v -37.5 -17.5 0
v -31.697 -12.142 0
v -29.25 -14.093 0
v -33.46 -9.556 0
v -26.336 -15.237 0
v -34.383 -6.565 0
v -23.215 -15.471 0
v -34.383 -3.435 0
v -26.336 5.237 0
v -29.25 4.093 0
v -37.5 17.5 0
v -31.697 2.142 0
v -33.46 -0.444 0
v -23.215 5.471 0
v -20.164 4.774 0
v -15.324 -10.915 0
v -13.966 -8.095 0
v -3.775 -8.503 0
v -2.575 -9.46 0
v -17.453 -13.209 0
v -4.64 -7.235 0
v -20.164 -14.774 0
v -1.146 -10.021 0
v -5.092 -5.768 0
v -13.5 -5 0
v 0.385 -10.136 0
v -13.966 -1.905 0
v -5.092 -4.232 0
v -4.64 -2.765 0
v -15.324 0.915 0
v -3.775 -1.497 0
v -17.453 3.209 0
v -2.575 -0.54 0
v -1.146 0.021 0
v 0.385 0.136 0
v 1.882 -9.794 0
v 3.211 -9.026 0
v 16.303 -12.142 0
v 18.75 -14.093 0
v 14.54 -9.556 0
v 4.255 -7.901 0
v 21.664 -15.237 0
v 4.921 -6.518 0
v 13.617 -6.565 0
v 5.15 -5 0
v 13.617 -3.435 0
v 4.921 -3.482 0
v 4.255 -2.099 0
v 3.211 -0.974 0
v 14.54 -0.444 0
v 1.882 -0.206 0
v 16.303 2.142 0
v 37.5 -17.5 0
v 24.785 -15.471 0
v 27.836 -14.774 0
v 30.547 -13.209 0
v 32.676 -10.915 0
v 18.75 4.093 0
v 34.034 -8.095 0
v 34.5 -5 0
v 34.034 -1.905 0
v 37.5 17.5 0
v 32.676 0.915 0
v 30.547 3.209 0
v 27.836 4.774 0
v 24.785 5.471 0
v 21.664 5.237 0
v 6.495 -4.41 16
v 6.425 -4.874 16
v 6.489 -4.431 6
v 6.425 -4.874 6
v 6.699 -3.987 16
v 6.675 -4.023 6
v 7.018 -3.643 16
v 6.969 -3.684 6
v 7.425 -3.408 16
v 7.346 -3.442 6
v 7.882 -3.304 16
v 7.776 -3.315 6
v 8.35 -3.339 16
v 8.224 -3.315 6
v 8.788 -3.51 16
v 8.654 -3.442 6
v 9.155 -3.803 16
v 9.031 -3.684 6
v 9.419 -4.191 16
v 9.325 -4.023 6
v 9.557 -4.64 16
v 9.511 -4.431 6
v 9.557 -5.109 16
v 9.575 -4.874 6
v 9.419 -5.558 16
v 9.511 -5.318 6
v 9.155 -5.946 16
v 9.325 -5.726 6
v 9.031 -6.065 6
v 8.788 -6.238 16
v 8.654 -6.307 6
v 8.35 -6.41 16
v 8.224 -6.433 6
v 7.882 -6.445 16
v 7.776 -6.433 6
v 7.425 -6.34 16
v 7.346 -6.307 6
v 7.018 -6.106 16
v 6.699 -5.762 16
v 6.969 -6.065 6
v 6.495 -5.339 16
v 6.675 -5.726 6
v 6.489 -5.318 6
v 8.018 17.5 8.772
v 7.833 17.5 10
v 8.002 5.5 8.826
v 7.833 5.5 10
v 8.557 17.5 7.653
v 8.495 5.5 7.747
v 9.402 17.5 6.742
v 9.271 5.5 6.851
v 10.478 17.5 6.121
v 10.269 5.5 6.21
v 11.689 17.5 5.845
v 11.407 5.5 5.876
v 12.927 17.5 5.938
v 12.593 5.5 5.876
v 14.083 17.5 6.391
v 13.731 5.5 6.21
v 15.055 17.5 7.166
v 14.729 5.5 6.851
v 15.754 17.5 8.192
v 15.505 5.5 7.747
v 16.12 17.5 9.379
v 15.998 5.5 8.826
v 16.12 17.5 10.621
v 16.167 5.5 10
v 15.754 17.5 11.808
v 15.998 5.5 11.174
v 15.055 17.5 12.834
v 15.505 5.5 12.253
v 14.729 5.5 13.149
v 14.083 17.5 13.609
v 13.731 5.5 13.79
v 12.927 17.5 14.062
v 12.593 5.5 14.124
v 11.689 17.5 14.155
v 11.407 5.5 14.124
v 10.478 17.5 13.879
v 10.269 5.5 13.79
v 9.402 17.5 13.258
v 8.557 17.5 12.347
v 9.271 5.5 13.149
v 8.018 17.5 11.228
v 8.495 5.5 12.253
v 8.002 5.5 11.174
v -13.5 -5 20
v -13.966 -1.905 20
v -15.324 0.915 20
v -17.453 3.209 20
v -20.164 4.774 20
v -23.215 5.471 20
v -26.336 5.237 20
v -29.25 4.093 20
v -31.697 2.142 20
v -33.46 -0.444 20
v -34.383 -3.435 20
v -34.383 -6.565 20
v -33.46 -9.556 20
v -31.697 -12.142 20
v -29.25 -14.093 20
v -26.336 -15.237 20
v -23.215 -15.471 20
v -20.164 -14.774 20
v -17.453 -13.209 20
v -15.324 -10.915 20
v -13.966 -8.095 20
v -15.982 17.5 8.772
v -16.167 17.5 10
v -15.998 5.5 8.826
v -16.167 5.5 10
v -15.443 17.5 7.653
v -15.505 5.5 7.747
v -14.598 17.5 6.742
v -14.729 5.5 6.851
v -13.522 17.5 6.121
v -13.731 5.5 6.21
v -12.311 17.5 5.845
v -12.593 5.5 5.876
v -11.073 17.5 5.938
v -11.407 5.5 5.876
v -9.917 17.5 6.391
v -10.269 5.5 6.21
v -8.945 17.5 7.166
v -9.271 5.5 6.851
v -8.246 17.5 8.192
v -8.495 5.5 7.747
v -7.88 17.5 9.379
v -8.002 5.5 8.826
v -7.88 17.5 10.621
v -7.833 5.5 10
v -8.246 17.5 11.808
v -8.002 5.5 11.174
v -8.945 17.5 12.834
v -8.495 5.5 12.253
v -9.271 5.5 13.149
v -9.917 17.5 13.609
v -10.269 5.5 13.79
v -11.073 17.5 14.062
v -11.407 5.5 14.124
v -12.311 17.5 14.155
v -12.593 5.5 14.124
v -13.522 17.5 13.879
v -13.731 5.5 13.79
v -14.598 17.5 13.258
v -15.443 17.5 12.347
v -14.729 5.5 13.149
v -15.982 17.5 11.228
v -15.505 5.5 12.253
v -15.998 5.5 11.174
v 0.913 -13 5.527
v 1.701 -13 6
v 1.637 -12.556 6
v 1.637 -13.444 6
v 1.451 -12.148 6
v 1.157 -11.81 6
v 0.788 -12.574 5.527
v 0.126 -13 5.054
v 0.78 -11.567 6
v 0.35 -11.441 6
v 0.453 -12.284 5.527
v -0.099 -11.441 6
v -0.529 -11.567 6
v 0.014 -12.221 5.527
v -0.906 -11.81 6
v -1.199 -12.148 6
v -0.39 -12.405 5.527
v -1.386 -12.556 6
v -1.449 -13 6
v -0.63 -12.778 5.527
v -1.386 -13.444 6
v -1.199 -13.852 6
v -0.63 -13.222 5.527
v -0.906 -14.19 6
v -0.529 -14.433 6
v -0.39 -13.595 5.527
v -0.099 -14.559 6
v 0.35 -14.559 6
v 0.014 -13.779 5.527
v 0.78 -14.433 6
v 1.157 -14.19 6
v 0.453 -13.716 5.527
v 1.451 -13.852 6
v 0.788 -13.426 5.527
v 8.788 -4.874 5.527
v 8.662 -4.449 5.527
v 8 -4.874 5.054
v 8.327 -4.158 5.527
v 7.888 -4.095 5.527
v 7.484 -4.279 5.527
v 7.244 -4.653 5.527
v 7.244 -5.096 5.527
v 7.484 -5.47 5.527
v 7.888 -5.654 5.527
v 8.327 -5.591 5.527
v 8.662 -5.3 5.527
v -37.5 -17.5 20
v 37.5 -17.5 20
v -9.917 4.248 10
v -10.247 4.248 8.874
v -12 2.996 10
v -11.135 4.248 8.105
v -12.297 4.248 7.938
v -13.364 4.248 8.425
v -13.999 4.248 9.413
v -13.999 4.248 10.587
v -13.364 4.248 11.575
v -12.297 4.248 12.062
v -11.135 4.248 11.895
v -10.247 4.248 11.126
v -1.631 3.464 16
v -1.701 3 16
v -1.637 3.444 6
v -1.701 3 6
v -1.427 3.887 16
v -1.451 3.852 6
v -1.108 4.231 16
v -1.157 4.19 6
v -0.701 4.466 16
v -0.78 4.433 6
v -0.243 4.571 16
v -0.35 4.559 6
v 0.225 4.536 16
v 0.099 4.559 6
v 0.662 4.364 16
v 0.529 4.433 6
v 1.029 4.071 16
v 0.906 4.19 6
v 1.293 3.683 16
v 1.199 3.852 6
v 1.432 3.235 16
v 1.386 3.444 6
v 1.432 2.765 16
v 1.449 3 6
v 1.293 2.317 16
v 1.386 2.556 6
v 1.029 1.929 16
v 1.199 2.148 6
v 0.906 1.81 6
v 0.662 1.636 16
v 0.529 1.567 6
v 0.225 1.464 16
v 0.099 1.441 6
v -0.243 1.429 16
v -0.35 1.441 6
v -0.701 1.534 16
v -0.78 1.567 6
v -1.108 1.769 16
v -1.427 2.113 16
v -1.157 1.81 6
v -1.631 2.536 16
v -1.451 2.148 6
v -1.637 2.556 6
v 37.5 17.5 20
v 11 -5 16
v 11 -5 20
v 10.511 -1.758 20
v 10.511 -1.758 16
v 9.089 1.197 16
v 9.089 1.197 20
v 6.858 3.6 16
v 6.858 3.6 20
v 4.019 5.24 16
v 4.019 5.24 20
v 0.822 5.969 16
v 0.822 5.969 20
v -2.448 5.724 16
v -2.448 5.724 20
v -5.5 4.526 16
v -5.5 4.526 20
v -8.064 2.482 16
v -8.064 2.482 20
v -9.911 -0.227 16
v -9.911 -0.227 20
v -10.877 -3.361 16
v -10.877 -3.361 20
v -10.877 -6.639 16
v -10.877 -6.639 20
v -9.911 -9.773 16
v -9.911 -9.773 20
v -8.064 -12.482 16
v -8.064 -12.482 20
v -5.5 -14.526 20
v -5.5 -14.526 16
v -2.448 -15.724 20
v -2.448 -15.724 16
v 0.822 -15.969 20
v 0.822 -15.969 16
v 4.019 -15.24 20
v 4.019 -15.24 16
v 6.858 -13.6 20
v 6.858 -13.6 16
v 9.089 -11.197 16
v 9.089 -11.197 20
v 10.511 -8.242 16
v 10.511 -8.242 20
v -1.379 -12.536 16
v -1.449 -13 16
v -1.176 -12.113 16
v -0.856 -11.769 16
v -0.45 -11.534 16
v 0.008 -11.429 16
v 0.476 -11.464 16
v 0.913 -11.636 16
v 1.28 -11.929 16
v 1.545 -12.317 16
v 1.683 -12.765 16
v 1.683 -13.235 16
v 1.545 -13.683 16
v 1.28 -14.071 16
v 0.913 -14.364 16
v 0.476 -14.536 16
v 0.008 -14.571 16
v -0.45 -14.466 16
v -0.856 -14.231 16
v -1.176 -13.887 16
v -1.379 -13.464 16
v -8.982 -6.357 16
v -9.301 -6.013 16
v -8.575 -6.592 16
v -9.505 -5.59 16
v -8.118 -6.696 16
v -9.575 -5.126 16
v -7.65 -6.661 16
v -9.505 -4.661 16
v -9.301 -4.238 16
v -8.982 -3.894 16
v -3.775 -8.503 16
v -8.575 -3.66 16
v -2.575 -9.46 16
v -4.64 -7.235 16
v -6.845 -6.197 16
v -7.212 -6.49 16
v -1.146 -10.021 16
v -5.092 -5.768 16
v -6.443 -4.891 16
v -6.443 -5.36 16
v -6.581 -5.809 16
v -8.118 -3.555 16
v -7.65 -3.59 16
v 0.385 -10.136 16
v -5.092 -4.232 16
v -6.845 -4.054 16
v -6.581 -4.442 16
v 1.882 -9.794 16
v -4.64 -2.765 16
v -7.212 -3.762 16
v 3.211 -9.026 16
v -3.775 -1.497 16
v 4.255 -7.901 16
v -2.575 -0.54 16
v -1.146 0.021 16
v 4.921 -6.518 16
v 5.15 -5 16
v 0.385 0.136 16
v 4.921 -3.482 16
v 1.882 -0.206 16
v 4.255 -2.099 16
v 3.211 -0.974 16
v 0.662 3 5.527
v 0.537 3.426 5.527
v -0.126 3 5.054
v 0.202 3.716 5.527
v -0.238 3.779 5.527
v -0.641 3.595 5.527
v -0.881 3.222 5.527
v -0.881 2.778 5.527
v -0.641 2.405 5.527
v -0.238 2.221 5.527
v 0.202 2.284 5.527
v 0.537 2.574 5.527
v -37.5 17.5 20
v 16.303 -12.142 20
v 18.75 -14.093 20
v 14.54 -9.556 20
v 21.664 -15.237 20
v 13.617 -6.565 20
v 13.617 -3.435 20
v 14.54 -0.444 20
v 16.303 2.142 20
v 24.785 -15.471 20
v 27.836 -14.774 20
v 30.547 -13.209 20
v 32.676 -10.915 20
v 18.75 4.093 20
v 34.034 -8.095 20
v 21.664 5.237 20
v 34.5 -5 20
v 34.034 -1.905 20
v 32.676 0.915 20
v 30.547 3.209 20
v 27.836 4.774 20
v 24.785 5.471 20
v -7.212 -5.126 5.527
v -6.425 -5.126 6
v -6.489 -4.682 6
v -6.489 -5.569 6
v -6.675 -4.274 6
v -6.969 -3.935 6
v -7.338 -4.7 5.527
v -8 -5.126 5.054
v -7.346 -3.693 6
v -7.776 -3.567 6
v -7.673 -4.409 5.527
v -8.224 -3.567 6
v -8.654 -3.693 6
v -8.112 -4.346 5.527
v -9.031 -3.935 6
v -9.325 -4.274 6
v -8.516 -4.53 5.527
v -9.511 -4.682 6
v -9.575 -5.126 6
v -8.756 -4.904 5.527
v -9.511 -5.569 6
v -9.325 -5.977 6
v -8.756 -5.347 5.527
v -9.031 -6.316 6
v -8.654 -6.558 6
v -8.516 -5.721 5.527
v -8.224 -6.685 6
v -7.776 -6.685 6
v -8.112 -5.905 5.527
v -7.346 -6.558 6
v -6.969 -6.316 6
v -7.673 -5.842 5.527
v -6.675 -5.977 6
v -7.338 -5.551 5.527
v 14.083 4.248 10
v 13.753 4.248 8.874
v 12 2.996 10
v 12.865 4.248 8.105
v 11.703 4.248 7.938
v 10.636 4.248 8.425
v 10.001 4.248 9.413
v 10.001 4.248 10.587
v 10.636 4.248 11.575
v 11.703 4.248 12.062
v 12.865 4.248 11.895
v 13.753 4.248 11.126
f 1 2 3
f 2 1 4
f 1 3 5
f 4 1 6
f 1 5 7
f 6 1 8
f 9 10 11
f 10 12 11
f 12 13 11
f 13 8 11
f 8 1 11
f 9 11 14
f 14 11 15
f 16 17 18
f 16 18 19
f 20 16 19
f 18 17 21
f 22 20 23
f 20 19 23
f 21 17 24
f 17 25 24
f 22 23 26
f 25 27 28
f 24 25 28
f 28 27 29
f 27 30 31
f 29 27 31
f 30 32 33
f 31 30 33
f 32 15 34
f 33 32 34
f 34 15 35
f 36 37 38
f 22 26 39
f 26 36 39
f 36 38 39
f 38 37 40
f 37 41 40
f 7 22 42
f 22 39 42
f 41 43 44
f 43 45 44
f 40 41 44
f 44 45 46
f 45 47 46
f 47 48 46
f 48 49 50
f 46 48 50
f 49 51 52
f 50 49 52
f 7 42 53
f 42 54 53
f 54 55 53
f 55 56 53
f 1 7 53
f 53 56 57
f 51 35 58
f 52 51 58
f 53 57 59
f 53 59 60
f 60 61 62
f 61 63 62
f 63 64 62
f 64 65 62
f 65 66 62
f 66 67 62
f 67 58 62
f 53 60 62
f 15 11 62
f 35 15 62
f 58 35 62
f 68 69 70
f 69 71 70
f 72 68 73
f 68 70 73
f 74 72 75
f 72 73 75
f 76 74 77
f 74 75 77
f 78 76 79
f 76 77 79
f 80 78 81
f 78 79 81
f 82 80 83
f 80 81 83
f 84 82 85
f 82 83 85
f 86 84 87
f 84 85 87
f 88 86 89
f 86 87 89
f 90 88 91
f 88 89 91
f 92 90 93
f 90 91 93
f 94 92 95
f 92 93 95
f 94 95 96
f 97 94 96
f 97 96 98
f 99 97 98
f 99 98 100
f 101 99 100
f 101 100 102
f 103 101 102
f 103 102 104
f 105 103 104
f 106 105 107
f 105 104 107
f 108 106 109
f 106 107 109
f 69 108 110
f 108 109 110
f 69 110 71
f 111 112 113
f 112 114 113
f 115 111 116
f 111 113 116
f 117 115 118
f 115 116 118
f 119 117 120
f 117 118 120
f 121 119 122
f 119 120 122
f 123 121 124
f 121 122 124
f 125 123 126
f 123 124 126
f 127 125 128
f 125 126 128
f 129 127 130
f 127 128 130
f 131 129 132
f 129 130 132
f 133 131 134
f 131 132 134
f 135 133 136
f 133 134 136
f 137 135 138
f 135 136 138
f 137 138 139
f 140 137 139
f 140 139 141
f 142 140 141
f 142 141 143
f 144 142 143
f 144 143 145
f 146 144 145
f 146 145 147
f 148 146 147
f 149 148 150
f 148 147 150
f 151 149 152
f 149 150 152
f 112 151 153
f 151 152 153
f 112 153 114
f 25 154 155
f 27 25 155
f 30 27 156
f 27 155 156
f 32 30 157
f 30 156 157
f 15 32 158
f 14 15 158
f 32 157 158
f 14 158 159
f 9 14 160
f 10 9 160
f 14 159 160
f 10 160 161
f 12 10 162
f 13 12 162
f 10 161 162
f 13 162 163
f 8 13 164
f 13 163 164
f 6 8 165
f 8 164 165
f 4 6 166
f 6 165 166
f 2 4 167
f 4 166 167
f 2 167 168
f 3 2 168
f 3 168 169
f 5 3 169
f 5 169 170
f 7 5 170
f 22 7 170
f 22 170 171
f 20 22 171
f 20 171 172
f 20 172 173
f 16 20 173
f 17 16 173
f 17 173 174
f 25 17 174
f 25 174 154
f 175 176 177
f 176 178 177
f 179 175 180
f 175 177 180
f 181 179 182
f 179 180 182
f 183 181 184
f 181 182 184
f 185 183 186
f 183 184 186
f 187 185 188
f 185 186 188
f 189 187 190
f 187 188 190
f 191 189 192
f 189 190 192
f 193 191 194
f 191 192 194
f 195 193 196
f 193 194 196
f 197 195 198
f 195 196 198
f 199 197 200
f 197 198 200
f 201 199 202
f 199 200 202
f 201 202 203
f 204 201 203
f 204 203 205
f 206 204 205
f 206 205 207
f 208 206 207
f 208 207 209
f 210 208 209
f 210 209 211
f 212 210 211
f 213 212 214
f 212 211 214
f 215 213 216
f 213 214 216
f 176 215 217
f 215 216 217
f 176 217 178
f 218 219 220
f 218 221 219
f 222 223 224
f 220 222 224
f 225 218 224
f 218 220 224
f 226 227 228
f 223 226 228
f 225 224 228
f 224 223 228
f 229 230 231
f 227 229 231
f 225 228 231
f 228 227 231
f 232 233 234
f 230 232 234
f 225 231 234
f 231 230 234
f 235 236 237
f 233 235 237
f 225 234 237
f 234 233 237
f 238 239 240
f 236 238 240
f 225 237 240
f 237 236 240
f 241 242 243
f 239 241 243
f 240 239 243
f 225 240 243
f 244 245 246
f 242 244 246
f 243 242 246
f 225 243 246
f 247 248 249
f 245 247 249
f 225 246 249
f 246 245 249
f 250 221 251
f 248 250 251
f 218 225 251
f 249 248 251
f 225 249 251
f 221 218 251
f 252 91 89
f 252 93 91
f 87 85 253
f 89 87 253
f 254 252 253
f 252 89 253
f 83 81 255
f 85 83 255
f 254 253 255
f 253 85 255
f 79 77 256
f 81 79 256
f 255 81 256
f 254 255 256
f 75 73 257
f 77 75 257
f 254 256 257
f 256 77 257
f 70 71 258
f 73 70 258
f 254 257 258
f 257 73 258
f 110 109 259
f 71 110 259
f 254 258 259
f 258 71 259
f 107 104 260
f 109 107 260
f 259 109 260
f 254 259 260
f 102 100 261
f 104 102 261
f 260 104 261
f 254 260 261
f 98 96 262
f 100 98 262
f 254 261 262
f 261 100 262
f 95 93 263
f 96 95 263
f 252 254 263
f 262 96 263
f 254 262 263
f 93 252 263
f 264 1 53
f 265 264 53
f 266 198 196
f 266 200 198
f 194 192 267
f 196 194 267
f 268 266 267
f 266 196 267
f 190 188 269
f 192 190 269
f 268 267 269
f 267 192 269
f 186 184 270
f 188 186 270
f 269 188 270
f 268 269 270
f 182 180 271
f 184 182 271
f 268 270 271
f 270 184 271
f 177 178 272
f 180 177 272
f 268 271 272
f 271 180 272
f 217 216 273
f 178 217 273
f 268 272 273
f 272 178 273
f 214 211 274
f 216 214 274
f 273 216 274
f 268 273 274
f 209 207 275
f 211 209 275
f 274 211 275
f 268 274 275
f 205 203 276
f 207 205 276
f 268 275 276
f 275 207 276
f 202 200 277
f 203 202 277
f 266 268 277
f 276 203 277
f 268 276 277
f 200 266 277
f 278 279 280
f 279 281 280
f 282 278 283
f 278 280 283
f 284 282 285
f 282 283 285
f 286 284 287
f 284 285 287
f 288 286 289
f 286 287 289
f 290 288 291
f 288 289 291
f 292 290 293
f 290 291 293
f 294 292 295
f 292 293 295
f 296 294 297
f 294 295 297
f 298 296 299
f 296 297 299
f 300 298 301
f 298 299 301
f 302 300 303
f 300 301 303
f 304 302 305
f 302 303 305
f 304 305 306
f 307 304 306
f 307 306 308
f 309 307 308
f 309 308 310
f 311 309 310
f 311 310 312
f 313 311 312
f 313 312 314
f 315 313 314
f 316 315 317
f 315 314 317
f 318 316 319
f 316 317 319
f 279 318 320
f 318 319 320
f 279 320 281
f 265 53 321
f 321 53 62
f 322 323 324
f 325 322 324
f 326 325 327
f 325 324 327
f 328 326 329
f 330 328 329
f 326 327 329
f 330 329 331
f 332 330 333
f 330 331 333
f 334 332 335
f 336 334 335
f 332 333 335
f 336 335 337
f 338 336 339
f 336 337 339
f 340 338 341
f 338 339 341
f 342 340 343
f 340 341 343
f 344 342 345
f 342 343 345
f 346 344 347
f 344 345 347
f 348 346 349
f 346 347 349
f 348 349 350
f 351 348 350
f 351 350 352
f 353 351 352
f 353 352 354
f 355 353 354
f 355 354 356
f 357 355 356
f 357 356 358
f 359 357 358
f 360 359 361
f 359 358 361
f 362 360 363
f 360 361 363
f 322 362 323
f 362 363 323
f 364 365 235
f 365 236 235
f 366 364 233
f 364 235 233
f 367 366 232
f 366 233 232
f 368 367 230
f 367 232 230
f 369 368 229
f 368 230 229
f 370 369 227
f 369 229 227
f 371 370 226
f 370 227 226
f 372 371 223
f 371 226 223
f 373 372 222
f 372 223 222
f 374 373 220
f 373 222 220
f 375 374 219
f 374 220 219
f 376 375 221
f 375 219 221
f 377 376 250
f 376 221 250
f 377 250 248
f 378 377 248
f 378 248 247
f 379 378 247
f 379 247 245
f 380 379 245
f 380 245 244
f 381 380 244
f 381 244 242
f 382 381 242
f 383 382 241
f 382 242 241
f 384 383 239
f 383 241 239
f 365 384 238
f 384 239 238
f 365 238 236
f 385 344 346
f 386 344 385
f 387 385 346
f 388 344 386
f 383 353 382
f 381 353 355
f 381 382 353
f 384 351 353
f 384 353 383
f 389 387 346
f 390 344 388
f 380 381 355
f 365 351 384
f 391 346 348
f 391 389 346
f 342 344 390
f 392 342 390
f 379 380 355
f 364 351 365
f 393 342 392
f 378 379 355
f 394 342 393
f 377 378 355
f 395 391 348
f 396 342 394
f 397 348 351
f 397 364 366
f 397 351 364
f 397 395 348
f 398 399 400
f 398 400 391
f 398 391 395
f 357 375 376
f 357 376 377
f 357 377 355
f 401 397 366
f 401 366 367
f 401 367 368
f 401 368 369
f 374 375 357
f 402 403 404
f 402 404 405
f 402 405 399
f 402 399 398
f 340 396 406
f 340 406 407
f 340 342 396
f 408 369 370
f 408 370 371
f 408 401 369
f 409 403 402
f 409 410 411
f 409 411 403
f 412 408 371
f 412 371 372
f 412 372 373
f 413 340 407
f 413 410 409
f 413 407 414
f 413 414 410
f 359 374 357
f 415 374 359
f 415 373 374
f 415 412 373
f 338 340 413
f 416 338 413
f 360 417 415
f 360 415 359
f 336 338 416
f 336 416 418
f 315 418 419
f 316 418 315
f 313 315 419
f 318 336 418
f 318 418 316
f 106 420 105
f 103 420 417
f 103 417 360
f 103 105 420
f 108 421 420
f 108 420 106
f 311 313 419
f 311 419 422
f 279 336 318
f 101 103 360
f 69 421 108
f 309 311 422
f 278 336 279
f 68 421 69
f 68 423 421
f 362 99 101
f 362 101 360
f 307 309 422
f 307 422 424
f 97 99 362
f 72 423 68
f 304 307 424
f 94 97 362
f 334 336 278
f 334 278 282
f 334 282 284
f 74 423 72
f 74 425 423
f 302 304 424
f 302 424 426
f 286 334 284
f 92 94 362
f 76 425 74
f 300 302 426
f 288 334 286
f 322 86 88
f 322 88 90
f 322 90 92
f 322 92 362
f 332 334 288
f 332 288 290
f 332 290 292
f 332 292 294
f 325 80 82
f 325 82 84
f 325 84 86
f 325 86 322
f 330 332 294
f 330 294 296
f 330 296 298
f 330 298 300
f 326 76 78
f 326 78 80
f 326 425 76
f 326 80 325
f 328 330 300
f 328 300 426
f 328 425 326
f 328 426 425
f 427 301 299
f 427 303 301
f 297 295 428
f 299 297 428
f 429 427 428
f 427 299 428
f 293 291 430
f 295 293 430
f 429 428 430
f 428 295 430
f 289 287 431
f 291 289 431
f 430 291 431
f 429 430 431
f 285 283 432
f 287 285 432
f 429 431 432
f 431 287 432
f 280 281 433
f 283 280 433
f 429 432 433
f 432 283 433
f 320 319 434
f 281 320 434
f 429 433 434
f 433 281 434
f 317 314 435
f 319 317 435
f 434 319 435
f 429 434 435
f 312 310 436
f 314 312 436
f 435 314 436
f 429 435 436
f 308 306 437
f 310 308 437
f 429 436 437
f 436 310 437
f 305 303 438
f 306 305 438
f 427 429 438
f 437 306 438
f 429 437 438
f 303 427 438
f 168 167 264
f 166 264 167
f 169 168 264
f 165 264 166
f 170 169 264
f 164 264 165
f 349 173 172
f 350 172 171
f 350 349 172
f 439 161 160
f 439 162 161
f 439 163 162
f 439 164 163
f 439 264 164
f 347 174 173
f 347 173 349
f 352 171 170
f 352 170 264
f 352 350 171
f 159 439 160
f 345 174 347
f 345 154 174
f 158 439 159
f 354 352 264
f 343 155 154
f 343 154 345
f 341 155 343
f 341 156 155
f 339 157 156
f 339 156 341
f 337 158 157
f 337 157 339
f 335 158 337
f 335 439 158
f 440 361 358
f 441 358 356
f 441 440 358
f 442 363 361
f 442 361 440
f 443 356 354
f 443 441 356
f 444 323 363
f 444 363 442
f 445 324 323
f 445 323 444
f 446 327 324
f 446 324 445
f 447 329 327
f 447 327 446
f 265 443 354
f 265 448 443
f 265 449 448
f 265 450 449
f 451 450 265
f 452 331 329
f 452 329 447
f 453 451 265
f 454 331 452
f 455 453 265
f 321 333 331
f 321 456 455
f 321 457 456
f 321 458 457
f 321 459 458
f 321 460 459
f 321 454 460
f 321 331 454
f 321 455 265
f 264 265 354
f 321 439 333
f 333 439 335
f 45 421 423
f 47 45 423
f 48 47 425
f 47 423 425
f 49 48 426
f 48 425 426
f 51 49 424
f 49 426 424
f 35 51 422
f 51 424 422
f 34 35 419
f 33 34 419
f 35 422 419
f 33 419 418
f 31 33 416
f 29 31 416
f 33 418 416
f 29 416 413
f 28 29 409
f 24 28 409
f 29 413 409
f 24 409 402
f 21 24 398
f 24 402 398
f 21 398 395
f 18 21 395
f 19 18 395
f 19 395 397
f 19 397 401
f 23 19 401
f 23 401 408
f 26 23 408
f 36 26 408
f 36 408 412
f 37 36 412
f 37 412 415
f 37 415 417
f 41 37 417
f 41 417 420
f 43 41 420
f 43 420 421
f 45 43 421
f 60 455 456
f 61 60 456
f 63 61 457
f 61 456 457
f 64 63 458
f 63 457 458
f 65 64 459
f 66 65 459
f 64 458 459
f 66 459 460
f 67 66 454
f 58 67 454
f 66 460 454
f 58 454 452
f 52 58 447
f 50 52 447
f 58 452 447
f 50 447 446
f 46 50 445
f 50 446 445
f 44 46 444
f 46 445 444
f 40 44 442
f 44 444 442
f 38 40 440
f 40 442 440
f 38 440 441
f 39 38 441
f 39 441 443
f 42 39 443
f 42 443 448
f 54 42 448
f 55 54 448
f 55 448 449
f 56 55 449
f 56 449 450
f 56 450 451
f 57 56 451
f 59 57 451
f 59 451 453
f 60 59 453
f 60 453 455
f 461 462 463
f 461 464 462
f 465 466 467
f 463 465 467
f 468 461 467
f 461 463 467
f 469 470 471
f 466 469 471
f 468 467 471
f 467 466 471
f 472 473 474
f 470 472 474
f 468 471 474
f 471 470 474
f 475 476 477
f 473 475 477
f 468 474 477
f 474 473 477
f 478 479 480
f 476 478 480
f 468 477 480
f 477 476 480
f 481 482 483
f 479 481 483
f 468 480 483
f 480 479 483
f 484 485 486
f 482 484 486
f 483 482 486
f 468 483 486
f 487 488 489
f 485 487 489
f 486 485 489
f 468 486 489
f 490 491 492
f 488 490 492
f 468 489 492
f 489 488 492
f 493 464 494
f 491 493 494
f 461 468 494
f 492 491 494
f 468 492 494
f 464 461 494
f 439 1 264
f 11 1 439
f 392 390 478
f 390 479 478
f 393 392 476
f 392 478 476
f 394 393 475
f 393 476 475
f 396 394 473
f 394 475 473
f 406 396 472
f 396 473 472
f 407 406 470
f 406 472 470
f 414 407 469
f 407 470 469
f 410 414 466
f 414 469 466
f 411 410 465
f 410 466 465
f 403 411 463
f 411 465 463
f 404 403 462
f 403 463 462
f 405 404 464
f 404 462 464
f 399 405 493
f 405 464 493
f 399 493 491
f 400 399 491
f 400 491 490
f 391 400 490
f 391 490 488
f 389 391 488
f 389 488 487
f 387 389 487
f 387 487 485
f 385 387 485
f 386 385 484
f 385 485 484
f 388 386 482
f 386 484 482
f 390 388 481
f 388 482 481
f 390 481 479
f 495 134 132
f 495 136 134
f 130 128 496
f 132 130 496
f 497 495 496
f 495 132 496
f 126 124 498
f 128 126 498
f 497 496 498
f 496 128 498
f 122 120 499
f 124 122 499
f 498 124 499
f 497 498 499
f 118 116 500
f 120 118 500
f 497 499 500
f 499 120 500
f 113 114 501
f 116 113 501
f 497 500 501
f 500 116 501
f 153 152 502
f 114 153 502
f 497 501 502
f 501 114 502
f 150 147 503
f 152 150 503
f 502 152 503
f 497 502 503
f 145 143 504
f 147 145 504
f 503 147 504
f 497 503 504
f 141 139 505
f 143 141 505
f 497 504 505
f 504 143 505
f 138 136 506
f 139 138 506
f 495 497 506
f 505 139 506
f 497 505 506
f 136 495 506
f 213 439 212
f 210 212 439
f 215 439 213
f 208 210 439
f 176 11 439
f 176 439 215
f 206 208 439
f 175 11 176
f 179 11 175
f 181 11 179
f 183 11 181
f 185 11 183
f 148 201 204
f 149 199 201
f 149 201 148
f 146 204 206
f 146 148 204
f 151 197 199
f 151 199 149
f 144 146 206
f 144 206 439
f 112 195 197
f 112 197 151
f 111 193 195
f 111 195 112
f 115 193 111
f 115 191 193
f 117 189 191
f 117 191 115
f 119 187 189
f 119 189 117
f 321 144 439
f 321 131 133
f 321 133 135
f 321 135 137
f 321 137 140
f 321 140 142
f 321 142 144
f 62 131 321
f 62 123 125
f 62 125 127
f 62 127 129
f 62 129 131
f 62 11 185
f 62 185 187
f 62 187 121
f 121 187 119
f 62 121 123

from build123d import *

# Parameters (mm, degrees)
ESBO_O1_W                                    = 75
ESBO_O1_H                                    = 35
RESSALTO_EXTRUS_O1_DEPTH                     = 20
ESBO_O2_R                                    = 10.5
ESBO_O2_R_2                                  = 5.15
CORTE_EXTRUS_O1_DEPTH                        = 21
ESBO_O3_R                                    = 11
CORTE_EXTRUS_O2_DEPTH                        = 4
FURO_ROSCADO_PARA_CONDU_TE_DE_M3X0_51_D      = 3.15
FURO_ROSCADO_PARA_CONDU_TE_DE_M3X0_51_DEPTH  = 10
FURO_ROSCADO_PARA_CONDU_TE_DE_M3X0_51_TIP    = 0.946355475
FURO_ROSCADO_PARA_CONDU_TE_DE_5_16_241_D     = 8.33374
FURO_ROSCADO_PARA_CONDU_TE_DE_5_16_241_DEPTH = 12
FURO_ROSCADO_PARA_CONDU_TE_DE_5_16_241_TIP   = 2.503708088


with BuildPart() as part:
    # Esboço1 → Ressalto-extrusão1 (new body)
    with BuildSketch(Plane.XY):
        Rectangle(ESBO_O1_W, ESBO_O1_H)
    extrude(amount=RESSALTO_EXTRUS_O1_DEPTH)

    # Esboço2 → Corte-extrusão1 (cut, through all)
    with BuildSketch(Plane.XY.offset(20)):
        with Locations((-24, -5)):
            Circle(ESBO_O2_R)
        with Locations((0, -5)):
            Circle(ESBO_O2_R_2)
        with Locations((24, -5)):
            Circle(ESBO_O2_R)
    extrude(amount=-CORTE_EXTRUS_O1_DEPTH, mode=Mode.SUBTRACT)

    # Esboço3 → Corte-extrusão2 (cut)
    with BuildSketch(Plane.XY.offset(20)):
        with Locations((0, -5)):
            Circle(ESBO_O3_R)
    extrude(amount=-CORTE_EXTRUS_O2_DEPTH, mode=Mode.SUBTRACT)

    # Furo roscado para conduíte de M3x0.51
    with Locations(Plane.XY.offset(16)):
        with Locations((-8, -5.125635555), (-0.125635555, 3), (8, -4.874364445), (0.125635555, -13)):
            Hole(FURO_ROSCADO_PARA_CONDU_TE_DE_M3X0_51_D / 2, depth=FURO_ROSCADO_PARA_CONDU_TE_DE_M3X0_51_DEPTH)
            with Locations((0, 0, -(FURO_ROSCADO_PARA_CONDU_TE_DE_M3X0_51_DEPTH + FURO_ROSCADO_PARA_CONDU_TE_DE_M3X0_51_TIP / 2))):  # 118° drill point
                Cone(0, FURO_ROSCADO_PARA_CONDU_TE_DE_M3X0_51_D / 2, FURO_ROSCADO_PARA_CONDU_TE_DE_M3X0_51_TIP, mode=Mode.SUBTRACT)

    # Furo roscado para conduíte de 5/16-241
    with Locations(Plane(origin=(0, 17.5, 0), x_dir=(1, 0, 0), z_dir=(0, 1, 0))):
        with Locations((-12, -10), (12, -10)):
            Hole(FURO_ROSCADO_PARA_CONDU_TE_DE_5_16_241_D / 2, depth=FURO_ROSCADO_PARA_CONDU_TE_DE_5_16_241_DEPTH)
            with Locations((0, 0, -(FURO_ROSCADO_PARA_CONDU_TE_DE_5_16_241_DEPTH + FURO_ROSCADO_PARA_CONDU_TE_DE_5_16_241_TIP / 2))):  # 118° drill point
                Cone(0, FURO_ROSCADO_PARA_CONDU_TE_DE_5_16_241_D / 2, FURO_ROSCADO_PARA_CONDU_TE_DE_5_16_241_TIP, mode=Mode.SUBTRACT)


solid = part.part
